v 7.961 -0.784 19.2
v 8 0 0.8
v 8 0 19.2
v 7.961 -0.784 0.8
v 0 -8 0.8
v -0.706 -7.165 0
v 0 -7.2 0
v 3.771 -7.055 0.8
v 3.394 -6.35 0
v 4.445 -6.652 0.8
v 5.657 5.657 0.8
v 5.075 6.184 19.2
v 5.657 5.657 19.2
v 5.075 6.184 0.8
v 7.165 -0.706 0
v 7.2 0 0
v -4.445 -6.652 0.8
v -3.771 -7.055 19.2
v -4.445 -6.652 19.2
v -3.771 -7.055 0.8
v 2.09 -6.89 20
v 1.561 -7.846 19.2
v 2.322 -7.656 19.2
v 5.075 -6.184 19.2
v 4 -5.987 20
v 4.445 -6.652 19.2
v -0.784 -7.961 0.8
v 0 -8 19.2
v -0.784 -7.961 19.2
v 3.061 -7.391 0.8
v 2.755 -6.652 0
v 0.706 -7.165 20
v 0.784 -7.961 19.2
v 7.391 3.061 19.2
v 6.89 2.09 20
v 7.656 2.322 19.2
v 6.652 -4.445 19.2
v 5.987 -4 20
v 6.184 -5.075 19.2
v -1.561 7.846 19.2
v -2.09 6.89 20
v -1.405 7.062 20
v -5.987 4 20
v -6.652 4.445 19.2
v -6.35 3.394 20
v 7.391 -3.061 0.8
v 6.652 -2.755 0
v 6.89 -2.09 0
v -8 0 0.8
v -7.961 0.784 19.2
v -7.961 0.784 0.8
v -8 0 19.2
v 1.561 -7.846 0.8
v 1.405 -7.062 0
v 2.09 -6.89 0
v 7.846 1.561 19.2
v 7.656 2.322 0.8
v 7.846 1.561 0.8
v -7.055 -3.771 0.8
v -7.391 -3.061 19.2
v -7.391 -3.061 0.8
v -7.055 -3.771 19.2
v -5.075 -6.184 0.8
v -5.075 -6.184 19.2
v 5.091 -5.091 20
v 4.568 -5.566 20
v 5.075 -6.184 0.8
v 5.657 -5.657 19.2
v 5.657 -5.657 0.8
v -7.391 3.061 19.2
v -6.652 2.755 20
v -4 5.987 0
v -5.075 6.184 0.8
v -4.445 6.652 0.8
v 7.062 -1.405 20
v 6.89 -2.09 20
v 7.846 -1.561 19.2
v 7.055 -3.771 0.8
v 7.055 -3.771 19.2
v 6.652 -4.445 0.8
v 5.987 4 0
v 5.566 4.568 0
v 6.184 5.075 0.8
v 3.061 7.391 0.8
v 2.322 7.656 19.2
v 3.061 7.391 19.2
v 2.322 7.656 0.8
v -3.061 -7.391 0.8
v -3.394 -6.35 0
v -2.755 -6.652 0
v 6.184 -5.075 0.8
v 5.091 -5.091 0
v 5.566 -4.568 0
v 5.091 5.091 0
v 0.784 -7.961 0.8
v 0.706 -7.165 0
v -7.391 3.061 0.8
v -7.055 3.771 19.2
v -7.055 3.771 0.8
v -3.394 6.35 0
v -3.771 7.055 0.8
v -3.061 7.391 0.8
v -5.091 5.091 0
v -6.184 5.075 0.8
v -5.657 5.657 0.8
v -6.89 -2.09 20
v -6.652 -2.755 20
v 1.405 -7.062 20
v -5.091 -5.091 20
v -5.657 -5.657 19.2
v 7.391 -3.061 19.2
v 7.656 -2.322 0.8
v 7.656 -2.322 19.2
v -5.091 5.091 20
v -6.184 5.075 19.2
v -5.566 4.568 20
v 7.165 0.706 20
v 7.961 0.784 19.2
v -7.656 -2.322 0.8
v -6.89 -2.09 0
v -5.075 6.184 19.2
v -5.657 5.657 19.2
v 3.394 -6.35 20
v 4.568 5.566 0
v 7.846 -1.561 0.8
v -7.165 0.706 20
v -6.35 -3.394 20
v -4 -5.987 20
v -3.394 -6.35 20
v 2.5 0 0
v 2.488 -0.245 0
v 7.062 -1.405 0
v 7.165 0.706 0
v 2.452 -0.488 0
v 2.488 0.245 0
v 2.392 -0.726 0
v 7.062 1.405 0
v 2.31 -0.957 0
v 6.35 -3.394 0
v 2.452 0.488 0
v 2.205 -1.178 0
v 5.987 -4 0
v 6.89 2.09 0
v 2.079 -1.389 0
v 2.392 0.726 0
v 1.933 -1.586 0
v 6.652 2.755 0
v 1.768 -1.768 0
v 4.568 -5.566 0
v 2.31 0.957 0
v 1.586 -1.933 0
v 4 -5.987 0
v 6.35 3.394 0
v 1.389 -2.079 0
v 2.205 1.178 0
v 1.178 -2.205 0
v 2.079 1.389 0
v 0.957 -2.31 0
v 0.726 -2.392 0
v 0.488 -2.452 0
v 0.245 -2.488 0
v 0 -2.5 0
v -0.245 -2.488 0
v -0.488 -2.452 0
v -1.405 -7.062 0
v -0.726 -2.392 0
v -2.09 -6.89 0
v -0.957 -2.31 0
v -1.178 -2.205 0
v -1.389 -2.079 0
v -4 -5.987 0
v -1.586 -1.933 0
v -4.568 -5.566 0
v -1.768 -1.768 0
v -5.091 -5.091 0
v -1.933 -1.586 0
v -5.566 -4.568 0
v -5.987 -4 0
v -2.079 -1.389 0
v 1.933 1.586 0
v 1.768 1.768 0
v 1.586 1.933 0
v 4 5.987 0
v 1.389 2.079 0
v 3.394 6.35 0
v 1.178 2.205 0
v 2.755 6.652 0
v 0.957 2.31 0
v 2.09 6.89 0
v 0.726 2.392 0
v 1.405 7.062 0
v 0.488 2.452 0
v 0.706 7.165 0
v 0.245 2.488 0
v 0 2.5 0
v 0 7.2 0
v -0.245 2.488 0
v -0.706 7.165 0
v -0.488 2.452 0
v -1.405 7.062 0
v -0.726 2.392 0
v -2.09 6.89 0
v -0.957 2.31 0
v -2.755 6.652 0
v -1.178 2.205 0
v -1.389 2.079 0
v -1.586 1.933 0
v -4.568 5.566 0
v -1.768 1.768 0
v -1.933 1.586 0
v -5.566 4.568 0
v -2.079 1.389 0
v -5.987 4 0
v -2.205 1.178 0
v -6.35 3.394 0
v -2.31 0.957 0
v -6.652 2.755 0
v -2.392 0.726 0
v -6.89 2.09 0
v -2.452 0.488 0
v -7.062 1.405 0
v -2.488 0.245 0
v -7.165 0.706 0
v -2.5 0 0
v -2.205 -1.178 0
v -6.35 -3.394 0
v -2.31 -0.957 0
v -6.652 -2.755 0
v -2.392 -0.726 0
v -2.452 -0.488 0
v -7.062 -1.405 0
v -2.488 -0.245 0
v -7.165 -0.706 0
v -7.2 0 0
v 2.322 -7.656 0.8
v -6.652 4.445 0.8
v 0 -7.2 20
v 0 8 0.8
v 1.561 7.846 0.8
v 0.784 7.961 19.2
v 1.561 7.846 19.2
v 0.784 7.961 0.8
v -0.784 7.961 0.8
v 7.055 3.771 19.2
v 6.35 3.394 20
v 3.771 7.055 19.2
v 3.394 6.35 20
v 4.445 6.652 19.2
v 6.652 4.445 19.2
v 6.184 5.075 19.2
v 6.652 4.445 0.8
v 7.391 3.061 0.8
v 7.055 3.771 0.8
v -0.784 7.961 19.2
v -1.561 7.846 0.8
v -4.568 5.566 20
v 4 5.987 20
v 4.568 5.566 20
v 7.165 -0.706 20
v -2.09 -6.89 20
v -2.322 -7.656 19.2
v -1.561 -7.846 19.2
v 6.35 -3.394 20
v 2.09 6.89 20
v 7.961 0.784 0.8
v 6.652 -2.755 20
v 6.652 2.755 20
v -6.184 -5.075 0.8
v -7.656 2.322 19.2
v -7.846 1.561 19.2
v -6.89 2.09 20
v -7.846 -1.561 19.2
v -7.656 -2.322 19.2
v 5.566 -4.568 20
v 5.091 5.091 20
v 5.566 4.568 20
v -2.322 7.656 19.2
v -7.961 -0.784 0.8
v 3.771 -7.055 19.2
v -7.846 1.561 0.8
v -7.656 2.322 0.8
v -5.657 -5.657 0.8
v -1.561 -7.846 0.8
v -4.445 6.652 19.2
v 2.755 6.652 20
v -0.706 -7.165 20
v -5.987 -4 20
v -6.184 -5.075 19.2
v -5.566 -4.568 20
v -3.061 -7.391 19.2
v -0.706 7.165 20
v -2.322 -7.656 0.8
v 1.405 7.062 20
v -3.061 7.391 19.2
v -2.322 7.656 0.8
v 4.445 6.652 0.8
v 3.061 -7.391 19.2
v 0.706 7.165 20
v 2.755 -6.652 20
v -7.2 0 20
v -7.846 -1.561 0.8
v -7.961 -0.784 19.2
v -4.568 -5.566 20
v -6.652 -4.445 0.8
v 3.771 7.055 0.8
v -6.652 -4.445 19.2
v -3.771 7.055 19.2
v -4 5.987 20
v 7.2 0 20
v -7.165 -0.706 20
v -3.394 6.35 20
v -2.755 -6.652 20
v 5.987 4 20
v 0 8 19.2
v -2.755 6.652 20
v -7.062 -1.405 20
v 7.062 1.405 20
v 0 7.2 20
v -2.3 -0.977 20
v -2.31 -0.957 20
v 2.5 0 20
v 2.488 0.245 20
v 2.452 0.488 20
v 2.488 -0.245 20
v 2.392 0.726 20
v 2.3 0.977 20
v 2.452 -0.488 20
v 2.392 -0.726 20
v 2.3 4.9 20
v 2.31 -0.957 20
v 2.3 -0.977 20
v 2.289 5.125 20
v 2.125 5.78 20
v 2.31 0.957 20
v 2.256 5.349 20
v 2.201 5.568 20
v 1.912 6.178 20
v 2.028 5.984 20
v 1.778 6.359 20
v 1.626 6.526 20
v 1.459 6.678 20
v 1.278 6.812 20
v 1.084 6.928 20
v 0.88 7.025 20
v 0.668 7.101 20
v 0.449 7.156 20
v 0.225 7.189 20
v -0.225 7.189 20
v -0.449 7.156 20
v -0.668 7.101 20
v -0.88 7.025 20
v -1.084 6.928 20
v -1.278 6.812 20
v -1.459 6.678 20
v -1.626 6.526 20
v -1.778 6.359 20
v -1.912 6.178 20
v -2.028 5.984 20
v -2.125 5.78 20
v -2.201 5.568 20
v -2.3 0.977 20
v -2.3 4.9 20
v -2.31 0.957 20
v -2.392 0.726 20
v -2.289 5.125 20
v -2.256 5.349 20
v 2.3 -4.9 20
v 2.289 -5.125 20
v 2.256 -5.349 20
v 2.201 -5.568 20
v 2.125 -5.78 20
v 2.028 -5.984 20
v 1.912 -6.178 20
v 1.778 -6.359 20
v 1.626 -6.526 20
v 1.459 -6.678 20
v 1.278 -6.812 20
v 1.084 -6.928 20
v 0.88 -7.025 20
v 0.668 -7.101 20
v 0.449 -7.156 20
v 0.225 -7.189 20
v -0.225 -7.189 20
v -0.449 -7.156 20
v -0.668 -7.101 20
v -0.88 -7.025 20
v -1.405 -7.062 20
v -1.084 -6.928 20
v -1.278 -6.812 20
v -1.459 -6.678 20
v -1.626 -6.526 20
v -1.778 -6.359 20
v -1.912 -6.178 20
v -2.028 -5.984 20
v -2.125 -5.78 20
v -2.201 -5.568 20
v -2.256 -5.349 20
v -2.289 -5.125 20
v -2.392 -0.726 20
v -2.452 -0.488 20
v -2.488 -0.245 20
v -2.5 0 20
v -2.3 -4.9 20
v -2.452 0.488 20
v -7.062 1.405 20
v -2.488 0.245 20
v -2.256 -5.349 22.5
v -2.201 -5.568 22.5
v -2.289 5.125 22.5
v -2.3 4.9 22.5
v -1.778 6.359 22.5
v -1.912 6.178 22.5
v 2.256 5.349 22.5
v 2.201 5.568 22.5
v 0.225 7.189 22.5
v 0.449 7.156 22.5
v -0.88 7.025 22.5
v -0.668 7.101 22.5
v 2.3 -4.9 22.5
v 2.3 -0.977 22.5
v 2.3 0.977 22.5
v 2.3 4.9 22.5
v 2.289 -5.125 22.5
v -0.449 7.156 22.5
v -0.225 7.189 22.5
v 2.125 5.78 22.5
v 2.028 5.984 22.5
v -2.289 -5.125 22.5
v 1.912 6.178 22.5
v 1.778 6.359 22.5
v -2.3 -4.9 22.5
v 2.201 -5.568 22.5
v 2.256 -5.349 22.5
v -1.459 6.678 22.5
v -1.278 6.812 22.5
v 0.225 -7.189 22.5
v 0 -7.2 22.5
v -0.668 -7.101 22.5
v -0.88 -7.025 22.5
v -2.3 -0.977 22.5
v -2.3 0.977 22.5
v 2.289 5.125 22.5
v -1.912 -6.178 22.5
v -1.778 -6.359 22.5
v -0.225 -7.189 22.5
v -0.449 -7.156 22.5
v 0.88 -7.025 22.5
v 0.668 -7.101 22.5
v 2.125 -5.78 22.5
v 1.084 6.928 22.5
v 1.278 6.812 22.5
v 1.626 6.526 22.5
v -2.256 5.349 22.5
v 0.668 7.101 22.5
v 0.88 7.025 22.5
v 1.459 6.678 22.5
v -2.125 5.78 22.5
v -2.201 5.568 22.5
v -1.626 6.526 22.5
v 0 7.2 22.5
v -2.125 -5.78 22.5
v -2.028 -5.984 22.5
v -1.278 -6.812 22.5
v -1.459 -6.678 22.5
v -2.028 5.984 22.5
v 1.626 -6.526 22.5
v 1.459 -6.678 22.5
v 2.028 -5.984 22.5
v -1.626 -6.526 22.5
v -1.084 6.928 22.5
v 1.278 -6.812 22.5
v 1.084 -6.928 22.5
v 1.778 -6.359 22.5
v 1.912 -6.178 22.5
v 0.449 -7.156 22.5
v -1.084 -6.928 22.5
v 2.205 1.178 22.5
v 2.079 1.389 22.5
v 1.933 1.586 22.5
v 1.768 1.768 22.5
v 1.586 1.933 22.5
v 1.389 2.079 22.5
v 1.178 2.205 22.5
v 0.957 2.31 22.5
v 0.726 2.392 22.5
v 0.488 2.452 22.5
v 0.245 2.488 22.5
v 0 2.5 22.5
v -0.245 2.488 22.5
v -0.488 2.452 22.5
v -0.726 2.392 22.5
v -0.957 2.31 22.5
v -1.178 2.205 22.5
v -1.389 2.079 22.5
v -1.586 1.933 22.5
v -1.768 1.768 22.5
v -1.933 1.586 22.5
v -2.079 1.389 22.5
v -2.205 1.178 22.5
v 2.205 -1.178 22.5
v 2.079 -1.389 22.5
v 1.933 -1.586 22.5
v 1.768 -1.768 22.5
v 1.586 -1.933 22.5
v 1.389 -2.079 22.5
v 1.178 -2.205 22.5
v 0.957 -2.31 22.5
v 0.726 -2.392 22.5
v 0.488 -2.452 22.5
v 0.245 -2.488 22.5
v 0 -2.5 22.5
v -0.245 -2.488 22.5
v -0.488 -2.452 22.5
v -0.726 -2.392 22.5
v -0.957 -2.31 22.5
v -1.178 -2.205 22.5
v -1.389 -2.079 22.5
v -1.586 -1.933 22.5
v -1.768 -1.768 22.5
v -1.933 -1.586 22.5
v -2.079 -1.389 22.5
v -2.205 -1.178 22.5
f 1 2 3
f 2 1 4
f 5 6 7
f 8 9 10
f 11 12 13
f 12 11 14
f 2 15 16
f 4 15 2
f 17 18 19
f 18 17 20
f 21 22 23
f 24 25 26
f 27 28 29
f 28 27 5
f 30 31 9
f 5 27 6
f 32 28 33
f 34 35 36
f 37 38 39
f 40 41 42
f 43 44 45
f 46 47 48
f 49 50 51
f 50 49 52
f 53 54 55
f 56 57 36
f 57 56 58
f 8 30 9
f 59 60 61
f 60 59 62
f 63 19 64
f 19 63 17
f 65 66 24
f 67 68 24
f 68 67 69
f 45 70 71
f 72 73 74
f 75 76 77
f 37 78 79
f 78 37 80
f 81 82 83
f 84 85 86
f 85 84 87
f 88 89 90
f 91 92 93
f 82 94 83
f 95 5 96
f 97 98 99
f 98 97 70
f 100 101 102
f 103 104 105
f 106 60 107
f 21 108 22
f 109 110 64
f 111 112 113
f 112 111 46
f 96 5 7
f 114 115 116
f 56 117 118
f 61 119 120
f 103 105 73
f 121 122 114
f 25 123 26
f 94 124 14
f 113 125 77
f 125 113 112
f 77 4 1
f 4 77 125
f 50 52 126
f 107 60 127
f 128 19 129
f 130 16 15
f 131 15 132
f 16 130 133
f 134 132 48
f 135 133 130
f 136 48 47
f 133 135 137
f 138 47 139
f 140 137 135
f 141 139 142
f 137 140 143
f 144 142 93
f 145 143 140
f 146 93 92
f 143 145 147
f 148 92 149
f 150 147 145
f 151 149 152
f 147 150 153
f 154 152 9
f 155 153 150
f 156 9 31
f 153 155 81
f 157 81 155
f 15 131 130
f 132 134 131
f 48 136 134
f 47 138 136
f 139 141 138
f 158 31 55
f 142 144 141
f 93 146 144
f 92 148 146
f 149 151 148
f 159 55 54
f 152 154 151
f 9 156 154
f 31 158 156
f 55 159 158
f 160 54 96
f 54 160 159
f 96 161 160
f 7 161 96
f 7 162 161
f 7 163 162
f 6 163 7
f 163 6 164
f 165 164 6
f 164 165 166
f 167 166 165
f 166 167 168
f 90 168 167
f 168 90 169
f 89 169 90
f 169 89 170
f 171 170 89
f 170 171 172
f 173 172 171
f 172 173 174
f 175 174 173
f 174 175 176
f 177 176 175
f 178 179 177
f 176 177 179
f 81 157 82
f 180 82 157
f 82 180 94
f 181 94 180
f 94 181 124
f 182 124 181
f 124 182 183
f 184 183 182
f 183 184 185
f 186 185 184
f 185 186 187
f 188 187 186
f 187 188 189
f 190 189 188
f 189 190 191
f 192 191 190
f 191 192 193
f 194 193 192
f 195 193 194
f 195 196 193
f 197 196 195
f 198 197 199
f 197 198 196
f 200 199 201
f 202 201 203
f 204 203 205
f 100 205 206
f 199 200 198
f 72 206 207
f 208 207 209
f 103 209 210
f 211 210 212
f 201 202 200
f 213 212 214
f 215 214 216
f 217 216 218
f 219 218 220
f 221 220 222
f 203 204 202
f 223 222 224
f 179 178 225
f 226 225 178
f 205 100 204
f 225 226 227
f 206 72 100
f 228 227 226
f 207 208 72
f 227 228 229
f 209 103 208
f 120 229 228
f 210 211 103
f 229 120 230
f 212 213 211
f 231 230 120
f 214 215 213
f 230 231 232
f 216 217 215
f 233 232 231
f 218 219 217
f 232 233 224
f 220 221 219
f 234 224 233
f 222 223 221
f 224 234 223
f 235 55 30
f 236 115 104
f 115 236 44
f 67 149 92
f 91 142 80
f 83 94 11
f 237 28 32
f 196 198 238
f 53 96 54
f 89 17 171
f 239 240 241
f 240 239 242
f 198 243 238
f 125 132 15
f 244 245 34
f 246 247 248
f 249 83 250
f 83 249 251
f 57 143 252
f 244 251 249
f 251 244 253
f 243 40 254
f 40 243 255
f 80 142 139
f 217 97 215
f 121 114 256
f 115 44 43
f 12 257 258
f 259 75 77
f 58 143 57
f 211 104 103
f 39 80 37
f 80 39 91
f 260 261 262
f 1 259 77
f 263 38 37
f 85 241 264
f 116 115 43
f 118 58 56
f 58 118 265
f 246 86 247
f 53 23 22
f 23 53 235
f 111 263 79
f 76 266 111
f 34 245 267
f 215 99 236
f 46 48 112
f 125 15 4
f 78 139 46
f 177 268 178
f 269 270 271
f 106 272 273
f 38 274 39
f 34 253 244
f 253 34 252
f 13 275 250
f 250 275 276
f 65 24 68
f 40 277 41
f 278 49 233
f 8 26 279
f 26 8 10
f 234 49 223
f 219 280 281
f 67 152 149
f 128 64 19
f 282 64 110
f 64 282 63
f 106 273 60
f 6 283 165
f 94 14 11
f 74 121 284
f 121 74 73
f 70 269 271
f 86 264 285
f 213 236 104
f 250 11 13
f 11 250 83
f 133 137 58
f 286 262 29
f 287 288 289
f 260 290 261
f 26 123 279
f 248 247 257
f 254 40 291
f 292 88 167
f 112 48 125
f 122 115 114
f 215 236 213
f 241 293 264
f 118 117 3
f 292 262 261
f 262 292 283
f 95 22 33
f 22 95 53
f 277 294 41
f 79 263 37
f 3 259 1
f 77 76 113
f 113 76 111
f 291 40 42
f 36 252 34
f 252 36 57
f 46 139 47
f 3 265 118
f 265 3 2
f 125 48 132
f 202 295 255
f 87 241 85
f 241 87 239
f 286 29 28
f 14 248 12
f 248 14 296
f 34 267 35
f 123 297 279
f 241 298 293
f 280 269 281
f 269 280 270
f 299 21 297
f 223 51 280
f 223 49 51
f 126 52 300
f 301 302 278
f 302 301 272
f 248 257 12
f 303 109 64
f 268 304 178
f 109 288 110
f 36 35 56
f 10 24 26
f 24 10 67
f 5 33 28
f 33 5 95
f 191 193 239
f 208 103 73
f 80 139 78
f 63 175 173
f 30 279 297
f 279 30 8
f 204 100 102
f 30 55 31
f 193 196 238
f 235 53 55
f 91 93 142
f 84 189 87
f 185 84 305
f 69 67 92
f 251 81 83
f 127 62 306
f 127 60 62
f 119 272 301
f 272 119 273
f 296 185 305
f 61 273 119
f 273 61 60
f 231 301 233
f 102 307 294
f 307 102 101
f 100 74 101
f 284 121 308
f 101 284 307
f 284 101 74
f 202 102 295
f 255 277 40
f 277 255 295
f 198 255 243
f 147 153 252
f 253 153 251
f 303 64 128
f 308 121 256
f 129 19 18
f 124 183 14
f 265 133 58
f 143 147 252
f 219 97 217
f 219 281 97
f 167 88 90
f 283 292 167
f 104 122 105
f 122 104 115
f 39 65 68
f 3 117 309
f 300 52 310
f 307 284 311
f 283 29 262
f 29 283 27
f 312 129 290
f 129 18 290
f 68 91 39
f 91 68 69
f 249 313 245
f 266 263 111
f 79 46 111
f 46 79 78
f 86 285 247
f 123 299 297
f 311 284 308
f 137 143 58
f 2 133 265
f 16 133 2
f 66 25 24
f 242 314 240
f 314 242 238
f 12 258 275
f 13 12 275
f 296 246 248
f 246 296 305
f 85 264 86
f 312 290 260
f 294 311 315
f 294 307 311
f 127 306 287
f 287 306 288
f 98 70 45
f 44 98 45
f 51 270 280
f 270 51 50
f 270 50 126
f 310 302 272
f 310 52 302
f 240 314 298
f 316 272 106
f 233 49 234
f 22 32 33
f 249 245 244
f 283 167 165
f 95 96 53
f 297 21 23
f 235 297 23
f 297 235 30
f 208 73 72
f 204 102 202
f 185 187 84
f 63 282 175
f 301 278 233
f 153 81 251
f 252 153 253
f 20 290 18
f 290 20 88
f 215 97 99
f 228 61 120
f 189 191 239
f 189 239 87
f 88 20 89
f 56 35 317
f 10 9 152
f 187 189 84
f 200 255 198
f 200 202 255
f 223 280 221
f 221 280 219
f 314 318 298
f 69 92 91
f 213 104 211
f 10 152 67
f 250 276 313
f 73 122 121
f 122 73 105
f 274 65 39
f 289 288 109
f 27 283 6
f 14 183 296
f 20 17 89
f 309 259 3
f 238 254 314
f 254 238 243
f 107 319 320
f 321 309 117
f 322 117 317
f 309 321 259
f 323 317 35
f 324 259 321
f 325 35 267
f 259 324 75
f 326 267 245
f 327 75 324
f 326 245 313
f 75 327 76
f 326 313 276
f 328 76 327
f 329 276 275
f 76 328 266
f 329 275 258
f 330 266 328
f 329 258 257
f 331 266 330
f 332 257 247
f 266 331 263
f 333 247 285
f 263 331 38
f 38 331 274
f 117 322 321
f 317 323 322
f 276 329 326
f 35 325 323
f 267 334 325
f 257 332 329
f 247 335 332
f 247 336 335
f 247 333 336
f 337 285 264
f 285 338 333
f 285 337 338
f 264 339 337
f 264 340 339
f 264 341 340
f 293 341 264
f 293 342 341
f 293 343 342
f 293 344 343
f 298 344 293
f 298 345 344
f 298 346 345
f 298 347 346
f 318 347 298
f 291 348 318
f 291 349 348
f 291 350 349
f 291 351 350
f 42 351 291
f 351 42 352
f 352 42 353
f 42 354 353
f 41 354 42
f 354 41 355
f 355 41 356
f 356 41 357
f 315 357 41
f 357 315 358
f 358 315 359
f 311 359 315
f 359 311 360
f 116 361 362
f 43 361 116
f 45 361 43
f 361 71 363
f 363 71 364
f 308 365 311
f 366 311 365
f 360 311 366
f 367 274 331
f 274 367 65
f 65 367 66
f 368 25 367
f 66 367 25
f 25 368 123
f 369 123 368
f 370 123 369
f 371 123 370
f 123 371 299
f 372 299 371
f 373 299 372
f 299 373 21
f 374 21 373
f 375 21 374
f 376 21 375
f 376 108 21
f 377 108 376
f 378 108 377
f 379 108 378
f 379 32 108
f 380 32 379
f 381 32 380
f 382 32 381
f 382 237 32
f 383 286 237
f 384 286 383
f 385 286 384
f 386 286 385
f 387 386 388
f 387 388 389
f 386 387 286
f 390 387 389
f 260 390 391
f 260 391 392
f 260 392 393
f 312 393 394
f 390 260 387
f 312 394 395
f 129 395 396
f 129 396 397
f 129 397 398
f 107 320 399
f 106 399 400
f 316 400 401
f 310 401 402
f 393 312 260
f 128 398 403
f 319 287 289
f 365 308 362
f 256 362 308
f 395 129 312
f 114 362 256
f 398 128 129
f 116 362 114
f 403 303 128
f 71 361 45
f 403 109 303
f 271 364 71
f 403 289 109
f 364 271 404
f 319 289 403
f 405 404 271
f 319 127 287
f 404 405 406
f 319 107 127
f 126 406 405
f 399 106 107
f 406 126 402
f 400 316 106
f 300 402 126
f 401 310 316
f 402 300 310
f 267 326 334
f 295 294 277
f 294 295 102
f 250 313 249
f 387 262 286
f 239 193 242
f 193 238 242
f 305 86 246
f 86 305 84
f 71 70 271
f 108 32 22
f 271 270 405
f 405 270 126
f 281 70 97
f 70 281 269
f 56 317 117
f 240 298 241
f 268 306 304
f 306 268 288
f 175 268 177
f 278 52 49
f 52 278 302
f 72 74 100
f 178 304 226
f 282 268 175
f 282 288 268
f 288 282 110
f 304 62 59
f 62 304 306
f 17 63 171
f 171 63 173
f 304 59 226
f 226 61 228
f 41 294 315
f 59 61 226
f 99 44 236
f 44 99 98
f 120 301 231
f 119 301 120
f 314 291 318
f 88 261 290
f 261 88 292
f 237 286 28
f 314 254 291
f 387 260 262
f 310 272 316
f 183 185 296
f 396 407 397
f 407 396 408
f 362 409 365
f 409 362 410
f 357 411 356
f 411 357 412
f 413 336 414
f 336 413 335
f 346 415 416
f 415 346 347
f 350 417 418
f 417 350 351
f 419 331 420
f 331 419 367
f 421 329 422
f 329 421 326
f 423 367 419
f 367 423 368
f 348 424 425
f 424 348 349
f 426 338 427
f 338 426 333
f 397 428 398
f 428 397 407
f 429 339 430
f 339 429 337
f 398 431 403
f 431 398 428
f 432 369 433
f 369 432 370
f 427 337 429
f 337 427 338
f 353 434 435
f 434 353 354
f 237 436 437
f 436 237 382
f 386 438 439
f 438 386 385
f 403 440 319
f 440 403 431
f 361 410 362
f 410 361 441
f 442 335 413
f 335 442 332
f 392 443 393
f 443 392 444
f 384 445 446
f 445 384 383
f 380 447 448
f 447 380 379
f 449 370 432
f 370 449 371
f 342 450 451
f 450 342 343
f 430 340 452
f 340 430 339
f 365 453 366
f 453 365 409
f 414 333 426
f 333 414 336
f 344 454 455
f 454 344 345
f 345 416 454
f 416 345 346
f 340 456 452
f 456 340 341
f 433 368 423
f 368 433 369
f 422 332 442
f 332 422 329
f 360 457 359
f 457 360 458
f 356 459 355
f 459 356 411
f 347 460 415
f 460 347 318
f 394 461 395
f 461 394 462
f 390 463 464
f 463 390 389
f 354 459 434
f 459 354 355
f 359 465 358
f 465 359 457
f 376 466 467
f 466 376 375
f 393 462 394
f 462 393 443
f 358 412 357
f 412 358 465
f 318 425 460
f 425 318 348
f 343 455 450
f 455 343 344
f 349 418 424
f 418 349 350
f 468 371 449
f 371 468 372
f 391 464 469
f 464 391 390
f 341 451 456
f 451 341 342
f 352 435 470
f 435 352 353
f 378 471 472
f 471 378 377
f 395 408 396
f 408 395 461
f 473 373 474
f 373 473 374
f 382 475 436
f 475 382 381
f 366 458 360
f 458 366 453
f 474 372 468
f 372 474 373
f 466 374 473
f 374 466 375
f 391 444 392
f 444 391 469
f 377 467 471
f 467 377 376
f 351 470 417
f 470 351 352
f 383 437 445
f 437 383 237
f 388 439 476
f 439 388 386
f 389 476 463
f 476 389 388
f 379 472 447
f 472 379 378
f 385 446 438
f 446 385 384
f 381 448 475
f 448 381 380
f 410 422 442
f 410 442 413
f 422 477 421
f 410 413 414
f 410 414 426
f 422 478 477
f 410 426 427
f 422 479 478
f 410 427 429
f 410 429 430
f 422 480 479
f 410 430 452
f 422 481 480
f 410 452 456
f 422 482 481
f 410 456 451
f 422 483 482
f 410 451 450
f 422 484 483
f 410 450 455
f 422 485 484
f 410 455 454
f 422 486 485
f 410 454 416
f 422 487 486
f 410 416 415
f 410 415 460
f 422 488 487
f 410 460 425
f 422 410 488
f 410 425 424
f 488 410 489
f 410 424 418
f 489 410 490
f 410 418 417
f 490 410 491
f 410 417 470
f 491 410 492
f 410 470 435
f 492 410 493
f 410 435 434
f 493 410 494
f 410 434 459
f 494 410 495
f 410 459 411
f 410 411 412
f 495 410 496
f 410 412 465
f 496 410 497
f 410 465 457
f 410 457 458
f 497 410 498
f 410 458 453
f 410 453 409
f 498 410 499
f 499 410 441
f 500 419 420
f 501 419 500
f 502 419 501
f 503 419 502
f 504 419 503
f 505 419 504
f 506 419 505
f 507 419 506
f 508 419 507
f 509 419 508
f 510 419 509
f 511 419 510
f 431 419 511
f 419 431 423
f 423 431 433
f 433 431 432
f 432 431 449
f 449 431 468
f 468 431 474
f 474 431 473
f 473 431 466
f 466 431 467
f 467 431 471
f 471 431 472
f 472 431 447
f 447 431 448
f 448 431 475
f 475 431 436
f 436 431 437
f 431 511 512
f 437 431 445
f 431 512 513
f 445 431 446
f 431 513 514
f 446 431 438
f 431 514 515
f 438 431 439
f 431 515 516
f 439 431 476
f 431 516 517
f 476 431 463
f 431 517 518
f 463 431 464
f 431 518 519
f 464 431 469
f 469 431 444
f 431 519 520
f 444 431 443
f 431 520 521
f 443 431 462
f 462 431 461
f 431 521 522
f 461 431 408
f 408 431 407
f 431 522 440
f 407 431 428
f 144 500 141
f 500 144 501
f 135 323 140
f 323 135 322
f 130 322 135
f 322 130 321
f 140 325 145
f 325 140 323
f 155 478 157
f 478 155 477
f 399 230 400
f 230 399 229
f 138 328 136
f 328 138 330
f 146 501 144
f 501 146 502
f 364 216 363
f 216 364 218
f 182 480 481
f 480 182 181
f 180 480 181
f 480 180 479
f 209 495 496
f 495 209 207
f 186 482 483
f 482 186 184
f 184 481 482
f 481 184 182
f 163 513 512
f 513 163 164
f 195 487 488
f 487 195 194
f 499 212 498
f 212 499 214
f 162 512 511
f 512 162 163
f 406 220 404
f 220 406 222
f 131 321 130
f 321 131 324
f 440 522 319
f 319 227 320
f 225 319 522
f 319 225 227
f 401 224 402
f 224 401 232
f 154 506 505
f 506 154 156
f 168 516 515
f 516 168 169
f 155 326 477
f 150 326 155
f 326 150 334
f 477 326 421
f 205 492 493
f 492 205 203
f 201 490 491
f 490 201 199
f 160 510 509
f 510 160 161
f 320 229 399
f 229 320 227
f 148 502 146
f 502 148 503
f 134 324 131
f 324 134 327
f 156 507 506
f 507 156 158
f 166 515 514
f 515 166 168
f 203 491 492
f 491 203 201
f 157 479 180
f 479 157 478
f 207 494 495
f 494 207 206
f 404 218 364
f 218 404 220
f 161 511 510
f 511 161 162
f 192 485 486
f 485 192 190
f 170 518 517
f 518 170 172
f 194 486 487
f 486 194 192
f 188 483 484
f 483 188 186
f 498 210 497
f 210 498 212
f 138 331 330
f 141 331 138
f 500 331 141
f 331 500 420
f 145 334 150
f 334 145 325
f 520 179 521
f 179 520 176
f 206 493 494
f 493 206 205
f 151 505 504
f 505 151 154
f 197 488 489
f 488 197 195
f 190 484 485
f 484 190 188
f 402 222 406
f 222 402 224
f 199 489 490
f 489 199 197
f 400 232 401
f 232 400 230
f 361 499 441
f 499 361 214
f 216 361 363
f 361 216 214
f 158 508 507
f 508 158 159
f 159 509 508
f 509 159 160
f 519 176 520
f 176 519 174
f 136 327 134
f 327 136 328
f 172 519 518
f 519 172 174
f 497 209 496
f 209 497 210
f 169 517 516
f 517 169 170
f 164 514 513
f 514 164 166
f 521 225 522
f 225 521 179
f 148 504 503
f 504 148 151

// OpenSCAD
// SKÅDIS board wall fixings (1 Oct 2026), each fixing, from the front:
//   printed cap -> M5 x 25 penny washer -> SKÅDIS board -> printed 20 mm spacer -> brick
//   screw: Spectre 4.5 x 60 mm, brown 7 mm plug.
// 8 fixings; print 10 of each for spares.

$fn = 64;
part = "spacer";   // spacer | cap

// --- 20 mm stand-off ---
sp_len = 20;
sp_od  = 16;
sp_id  = 5.0;      // clearance for a 4.5 mm screw
sp_ch  = 0.8;      // edge chamfer

// Locating boss on the board end (like IKEA's): sits 2.5 mm into a 5 x 15 mm SKÅDIS slot
// so the spacer can't slide. The slot is only 5 mm wide, so with the screw through the
// middle the boss is the slot shape with the screw hole cut out: two lugs that fill the
// slot's ends above and below the screw.
boss_h = 2.5;          // board is 5 mm thick
boss_w = 4.6;          // slot 5 wide
boss_l = 14.4;         // slot 15 long
module spacer() {
    difference() {
        union() {
            hull() {
                cylinder(d = sp_od - 2*sp_ch, h = sp_len);
                translate([0, 0, sp_ch]) cylinder(d = sp_od, h = sp_len - 2*sp_ch);
            }
            // boss on top (board end) - prints straight up, no overhang
            translate([0, 0, sp_len - 0.01]) linear_extrude(boss_h + 0.01)
                hull() for (y = [-1, 1]) translate([0, y * (boss_l - boss_w)/2]) circle(d = boss_w);
        }
        translate([0, 0, -1]) cylinder(d = sp_id, h = sp_len + boss_h + 2);
    }
}

// --- black cap that press-fits over the penny washer and hides the screw head ---
wa_od   = 25;      // F&F penny washer M5 x 25
wa_t    = 1.5;     // washer thickness
head_h  = 3.2;     // a 4.5 mm countersunk head sits ~3 mm proud of a flat washer
cap_wall = 1.6;
cap_top  = 1.2;
cap_bore = wa_od + 0.4;          // 25.4 bore ...
rib_in   = 0.35;                 // ... with 6 crush ribs gripping at ~24.7
skirt    = wa_t + 0.3;           // grips the washer edge, sits on the board
cap_od   = cap_bore + 2*cap_wall;
cap_h    = skirt + head_h + cap_top;

// modelled top-down (flat top at z = 0) = its print orientation, no overhangs
module cap() {
    difference() {
        hull() {
            cylinder(d = cap_od - 2, h = 0.01);
            translate([0, 0, 1]) cylinder(d = cap_od, h = cap_h - 1);
        }
        translate([0, 0, cap_top]) cylinder(d = cap_bore, h = cap_h);
    }
    // crush ribs on the skirt only
    for (a = [0 : 60 : 359]) rotate(a)
        translate([cap_bore/2 - rib_in, -0.6, cap_h - skirt]) cube([rib_in + 0.2, 1.2, skirt]);
}

if (part == "spacer") spacer();
if (part == "cap") cap();
